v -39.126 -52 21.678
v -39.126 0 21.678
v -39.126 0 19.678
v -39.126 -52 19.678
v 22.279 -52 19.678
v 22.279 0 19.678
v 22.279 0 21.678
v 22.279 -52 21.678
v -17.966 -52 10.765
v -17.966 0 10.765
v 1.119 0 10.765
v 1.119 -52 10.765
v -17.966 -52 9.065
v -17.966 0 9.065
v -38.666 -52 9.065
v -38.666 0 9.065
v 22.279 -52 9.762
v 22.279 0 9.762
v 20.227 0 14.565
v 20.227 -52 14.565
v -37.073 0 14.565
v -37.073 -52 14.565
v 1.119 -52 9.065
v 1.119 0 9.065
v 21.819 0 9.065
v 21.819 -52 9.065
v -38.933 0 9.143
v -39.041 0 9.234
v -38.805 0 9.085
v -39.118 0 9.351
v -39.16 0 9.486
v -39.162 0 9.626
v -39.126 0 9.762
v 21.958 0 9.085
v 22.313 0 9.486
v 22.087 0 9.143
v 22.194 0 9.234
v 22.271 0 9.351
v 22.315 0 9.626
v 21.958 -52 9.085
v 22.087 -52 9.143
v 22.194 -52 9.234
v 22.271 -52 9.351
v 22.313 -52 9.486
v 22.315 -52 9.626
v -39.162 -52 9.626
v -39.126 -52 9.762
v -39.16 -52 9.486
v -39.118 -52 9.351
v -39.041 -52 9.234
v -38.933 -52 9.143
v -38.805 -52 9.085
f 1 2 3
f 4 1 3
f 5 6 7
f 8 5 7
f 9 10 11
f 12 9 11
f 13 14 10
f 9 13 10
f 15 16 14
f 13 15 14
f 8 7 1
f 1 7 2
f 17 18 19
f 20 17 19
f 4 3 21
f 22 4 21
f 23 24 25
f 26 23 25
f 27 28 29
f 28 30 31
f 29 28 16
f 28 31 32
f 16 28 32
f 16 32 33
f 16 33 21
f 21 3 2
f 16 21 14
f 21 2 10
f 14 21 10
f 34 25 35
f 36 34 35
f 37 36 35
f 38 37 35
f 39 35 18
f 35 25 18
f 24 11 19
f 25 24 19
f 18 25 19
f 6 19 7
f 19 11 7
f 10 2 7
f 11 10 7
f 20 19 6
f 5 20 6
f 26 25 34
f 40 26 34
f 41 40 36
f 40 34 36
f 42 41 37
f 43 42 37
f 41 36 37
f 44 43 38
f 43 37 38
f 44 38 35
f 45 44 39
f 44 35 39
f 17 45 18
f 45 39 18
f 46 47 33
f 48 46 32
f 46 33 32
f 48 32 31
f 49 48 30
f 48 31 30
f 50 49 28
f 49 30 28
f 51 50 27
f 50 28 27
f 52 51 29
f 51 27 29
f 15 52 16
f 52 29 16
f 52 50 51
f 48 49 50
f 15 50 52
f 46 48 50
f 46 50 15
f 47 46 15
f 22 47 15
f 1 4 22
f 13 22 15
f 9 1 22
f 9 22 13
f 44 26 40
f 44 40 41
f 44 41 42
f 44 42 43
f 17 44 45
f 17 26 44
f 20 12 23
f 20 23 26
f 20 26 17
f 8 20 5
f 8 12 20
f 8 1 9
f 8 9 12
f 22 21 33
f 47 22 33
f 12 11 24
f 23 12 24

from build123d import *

# Parameters (mm, degrees)
F1_DEPTH = 52


with BuildPart() as f1:
    # F0 (on Front) → F1 (new body)
    with BuildSketch(Plane.XZ):
        with BuildLine():
            Line((-37.073477, 14.565424), (-39.125901, 9.761879))
            ThreePointArc((-39.125901, 9.761879), (-39.083382, 9.28995), (-38.666112, 9.065424))
            Line((-38.666112, 9.065424), (-17.966112, 9.065424))
            Line((-17.966112, 9.065424), (-17.966112, 10.765424))
            Line((-17.966112, 10.765424), (1.119158, 10.765424))
            Line((1.119158, 10.765424), (1.119158, 9.065424))
            Line((1.119158, 9.065424), (21.819158, 9.065424))
            ThreePointArc((21.819158, 9.065424), (22.236428, 9.28995), (22.278947, 9.761879))
            Line((22.278947, 9.761879), (20.226523, 14.565424))
            Line((20.226523, 14.565424), (22.278947, 19.677687))
            Line((22.278947, 19.677687), (22.278947, 21.677687))
            Line((22.278947, 21.677687), (-39.125901, 21.677687))
            Line((-39.125901, 21.677687), (-39.125901, 19.677687))
            Line((-39.125901, 19.677687), (-37.073477, 14.565424))
        make_face()
    extrude(amount=F1_DEPTH)


solid = f1.part
